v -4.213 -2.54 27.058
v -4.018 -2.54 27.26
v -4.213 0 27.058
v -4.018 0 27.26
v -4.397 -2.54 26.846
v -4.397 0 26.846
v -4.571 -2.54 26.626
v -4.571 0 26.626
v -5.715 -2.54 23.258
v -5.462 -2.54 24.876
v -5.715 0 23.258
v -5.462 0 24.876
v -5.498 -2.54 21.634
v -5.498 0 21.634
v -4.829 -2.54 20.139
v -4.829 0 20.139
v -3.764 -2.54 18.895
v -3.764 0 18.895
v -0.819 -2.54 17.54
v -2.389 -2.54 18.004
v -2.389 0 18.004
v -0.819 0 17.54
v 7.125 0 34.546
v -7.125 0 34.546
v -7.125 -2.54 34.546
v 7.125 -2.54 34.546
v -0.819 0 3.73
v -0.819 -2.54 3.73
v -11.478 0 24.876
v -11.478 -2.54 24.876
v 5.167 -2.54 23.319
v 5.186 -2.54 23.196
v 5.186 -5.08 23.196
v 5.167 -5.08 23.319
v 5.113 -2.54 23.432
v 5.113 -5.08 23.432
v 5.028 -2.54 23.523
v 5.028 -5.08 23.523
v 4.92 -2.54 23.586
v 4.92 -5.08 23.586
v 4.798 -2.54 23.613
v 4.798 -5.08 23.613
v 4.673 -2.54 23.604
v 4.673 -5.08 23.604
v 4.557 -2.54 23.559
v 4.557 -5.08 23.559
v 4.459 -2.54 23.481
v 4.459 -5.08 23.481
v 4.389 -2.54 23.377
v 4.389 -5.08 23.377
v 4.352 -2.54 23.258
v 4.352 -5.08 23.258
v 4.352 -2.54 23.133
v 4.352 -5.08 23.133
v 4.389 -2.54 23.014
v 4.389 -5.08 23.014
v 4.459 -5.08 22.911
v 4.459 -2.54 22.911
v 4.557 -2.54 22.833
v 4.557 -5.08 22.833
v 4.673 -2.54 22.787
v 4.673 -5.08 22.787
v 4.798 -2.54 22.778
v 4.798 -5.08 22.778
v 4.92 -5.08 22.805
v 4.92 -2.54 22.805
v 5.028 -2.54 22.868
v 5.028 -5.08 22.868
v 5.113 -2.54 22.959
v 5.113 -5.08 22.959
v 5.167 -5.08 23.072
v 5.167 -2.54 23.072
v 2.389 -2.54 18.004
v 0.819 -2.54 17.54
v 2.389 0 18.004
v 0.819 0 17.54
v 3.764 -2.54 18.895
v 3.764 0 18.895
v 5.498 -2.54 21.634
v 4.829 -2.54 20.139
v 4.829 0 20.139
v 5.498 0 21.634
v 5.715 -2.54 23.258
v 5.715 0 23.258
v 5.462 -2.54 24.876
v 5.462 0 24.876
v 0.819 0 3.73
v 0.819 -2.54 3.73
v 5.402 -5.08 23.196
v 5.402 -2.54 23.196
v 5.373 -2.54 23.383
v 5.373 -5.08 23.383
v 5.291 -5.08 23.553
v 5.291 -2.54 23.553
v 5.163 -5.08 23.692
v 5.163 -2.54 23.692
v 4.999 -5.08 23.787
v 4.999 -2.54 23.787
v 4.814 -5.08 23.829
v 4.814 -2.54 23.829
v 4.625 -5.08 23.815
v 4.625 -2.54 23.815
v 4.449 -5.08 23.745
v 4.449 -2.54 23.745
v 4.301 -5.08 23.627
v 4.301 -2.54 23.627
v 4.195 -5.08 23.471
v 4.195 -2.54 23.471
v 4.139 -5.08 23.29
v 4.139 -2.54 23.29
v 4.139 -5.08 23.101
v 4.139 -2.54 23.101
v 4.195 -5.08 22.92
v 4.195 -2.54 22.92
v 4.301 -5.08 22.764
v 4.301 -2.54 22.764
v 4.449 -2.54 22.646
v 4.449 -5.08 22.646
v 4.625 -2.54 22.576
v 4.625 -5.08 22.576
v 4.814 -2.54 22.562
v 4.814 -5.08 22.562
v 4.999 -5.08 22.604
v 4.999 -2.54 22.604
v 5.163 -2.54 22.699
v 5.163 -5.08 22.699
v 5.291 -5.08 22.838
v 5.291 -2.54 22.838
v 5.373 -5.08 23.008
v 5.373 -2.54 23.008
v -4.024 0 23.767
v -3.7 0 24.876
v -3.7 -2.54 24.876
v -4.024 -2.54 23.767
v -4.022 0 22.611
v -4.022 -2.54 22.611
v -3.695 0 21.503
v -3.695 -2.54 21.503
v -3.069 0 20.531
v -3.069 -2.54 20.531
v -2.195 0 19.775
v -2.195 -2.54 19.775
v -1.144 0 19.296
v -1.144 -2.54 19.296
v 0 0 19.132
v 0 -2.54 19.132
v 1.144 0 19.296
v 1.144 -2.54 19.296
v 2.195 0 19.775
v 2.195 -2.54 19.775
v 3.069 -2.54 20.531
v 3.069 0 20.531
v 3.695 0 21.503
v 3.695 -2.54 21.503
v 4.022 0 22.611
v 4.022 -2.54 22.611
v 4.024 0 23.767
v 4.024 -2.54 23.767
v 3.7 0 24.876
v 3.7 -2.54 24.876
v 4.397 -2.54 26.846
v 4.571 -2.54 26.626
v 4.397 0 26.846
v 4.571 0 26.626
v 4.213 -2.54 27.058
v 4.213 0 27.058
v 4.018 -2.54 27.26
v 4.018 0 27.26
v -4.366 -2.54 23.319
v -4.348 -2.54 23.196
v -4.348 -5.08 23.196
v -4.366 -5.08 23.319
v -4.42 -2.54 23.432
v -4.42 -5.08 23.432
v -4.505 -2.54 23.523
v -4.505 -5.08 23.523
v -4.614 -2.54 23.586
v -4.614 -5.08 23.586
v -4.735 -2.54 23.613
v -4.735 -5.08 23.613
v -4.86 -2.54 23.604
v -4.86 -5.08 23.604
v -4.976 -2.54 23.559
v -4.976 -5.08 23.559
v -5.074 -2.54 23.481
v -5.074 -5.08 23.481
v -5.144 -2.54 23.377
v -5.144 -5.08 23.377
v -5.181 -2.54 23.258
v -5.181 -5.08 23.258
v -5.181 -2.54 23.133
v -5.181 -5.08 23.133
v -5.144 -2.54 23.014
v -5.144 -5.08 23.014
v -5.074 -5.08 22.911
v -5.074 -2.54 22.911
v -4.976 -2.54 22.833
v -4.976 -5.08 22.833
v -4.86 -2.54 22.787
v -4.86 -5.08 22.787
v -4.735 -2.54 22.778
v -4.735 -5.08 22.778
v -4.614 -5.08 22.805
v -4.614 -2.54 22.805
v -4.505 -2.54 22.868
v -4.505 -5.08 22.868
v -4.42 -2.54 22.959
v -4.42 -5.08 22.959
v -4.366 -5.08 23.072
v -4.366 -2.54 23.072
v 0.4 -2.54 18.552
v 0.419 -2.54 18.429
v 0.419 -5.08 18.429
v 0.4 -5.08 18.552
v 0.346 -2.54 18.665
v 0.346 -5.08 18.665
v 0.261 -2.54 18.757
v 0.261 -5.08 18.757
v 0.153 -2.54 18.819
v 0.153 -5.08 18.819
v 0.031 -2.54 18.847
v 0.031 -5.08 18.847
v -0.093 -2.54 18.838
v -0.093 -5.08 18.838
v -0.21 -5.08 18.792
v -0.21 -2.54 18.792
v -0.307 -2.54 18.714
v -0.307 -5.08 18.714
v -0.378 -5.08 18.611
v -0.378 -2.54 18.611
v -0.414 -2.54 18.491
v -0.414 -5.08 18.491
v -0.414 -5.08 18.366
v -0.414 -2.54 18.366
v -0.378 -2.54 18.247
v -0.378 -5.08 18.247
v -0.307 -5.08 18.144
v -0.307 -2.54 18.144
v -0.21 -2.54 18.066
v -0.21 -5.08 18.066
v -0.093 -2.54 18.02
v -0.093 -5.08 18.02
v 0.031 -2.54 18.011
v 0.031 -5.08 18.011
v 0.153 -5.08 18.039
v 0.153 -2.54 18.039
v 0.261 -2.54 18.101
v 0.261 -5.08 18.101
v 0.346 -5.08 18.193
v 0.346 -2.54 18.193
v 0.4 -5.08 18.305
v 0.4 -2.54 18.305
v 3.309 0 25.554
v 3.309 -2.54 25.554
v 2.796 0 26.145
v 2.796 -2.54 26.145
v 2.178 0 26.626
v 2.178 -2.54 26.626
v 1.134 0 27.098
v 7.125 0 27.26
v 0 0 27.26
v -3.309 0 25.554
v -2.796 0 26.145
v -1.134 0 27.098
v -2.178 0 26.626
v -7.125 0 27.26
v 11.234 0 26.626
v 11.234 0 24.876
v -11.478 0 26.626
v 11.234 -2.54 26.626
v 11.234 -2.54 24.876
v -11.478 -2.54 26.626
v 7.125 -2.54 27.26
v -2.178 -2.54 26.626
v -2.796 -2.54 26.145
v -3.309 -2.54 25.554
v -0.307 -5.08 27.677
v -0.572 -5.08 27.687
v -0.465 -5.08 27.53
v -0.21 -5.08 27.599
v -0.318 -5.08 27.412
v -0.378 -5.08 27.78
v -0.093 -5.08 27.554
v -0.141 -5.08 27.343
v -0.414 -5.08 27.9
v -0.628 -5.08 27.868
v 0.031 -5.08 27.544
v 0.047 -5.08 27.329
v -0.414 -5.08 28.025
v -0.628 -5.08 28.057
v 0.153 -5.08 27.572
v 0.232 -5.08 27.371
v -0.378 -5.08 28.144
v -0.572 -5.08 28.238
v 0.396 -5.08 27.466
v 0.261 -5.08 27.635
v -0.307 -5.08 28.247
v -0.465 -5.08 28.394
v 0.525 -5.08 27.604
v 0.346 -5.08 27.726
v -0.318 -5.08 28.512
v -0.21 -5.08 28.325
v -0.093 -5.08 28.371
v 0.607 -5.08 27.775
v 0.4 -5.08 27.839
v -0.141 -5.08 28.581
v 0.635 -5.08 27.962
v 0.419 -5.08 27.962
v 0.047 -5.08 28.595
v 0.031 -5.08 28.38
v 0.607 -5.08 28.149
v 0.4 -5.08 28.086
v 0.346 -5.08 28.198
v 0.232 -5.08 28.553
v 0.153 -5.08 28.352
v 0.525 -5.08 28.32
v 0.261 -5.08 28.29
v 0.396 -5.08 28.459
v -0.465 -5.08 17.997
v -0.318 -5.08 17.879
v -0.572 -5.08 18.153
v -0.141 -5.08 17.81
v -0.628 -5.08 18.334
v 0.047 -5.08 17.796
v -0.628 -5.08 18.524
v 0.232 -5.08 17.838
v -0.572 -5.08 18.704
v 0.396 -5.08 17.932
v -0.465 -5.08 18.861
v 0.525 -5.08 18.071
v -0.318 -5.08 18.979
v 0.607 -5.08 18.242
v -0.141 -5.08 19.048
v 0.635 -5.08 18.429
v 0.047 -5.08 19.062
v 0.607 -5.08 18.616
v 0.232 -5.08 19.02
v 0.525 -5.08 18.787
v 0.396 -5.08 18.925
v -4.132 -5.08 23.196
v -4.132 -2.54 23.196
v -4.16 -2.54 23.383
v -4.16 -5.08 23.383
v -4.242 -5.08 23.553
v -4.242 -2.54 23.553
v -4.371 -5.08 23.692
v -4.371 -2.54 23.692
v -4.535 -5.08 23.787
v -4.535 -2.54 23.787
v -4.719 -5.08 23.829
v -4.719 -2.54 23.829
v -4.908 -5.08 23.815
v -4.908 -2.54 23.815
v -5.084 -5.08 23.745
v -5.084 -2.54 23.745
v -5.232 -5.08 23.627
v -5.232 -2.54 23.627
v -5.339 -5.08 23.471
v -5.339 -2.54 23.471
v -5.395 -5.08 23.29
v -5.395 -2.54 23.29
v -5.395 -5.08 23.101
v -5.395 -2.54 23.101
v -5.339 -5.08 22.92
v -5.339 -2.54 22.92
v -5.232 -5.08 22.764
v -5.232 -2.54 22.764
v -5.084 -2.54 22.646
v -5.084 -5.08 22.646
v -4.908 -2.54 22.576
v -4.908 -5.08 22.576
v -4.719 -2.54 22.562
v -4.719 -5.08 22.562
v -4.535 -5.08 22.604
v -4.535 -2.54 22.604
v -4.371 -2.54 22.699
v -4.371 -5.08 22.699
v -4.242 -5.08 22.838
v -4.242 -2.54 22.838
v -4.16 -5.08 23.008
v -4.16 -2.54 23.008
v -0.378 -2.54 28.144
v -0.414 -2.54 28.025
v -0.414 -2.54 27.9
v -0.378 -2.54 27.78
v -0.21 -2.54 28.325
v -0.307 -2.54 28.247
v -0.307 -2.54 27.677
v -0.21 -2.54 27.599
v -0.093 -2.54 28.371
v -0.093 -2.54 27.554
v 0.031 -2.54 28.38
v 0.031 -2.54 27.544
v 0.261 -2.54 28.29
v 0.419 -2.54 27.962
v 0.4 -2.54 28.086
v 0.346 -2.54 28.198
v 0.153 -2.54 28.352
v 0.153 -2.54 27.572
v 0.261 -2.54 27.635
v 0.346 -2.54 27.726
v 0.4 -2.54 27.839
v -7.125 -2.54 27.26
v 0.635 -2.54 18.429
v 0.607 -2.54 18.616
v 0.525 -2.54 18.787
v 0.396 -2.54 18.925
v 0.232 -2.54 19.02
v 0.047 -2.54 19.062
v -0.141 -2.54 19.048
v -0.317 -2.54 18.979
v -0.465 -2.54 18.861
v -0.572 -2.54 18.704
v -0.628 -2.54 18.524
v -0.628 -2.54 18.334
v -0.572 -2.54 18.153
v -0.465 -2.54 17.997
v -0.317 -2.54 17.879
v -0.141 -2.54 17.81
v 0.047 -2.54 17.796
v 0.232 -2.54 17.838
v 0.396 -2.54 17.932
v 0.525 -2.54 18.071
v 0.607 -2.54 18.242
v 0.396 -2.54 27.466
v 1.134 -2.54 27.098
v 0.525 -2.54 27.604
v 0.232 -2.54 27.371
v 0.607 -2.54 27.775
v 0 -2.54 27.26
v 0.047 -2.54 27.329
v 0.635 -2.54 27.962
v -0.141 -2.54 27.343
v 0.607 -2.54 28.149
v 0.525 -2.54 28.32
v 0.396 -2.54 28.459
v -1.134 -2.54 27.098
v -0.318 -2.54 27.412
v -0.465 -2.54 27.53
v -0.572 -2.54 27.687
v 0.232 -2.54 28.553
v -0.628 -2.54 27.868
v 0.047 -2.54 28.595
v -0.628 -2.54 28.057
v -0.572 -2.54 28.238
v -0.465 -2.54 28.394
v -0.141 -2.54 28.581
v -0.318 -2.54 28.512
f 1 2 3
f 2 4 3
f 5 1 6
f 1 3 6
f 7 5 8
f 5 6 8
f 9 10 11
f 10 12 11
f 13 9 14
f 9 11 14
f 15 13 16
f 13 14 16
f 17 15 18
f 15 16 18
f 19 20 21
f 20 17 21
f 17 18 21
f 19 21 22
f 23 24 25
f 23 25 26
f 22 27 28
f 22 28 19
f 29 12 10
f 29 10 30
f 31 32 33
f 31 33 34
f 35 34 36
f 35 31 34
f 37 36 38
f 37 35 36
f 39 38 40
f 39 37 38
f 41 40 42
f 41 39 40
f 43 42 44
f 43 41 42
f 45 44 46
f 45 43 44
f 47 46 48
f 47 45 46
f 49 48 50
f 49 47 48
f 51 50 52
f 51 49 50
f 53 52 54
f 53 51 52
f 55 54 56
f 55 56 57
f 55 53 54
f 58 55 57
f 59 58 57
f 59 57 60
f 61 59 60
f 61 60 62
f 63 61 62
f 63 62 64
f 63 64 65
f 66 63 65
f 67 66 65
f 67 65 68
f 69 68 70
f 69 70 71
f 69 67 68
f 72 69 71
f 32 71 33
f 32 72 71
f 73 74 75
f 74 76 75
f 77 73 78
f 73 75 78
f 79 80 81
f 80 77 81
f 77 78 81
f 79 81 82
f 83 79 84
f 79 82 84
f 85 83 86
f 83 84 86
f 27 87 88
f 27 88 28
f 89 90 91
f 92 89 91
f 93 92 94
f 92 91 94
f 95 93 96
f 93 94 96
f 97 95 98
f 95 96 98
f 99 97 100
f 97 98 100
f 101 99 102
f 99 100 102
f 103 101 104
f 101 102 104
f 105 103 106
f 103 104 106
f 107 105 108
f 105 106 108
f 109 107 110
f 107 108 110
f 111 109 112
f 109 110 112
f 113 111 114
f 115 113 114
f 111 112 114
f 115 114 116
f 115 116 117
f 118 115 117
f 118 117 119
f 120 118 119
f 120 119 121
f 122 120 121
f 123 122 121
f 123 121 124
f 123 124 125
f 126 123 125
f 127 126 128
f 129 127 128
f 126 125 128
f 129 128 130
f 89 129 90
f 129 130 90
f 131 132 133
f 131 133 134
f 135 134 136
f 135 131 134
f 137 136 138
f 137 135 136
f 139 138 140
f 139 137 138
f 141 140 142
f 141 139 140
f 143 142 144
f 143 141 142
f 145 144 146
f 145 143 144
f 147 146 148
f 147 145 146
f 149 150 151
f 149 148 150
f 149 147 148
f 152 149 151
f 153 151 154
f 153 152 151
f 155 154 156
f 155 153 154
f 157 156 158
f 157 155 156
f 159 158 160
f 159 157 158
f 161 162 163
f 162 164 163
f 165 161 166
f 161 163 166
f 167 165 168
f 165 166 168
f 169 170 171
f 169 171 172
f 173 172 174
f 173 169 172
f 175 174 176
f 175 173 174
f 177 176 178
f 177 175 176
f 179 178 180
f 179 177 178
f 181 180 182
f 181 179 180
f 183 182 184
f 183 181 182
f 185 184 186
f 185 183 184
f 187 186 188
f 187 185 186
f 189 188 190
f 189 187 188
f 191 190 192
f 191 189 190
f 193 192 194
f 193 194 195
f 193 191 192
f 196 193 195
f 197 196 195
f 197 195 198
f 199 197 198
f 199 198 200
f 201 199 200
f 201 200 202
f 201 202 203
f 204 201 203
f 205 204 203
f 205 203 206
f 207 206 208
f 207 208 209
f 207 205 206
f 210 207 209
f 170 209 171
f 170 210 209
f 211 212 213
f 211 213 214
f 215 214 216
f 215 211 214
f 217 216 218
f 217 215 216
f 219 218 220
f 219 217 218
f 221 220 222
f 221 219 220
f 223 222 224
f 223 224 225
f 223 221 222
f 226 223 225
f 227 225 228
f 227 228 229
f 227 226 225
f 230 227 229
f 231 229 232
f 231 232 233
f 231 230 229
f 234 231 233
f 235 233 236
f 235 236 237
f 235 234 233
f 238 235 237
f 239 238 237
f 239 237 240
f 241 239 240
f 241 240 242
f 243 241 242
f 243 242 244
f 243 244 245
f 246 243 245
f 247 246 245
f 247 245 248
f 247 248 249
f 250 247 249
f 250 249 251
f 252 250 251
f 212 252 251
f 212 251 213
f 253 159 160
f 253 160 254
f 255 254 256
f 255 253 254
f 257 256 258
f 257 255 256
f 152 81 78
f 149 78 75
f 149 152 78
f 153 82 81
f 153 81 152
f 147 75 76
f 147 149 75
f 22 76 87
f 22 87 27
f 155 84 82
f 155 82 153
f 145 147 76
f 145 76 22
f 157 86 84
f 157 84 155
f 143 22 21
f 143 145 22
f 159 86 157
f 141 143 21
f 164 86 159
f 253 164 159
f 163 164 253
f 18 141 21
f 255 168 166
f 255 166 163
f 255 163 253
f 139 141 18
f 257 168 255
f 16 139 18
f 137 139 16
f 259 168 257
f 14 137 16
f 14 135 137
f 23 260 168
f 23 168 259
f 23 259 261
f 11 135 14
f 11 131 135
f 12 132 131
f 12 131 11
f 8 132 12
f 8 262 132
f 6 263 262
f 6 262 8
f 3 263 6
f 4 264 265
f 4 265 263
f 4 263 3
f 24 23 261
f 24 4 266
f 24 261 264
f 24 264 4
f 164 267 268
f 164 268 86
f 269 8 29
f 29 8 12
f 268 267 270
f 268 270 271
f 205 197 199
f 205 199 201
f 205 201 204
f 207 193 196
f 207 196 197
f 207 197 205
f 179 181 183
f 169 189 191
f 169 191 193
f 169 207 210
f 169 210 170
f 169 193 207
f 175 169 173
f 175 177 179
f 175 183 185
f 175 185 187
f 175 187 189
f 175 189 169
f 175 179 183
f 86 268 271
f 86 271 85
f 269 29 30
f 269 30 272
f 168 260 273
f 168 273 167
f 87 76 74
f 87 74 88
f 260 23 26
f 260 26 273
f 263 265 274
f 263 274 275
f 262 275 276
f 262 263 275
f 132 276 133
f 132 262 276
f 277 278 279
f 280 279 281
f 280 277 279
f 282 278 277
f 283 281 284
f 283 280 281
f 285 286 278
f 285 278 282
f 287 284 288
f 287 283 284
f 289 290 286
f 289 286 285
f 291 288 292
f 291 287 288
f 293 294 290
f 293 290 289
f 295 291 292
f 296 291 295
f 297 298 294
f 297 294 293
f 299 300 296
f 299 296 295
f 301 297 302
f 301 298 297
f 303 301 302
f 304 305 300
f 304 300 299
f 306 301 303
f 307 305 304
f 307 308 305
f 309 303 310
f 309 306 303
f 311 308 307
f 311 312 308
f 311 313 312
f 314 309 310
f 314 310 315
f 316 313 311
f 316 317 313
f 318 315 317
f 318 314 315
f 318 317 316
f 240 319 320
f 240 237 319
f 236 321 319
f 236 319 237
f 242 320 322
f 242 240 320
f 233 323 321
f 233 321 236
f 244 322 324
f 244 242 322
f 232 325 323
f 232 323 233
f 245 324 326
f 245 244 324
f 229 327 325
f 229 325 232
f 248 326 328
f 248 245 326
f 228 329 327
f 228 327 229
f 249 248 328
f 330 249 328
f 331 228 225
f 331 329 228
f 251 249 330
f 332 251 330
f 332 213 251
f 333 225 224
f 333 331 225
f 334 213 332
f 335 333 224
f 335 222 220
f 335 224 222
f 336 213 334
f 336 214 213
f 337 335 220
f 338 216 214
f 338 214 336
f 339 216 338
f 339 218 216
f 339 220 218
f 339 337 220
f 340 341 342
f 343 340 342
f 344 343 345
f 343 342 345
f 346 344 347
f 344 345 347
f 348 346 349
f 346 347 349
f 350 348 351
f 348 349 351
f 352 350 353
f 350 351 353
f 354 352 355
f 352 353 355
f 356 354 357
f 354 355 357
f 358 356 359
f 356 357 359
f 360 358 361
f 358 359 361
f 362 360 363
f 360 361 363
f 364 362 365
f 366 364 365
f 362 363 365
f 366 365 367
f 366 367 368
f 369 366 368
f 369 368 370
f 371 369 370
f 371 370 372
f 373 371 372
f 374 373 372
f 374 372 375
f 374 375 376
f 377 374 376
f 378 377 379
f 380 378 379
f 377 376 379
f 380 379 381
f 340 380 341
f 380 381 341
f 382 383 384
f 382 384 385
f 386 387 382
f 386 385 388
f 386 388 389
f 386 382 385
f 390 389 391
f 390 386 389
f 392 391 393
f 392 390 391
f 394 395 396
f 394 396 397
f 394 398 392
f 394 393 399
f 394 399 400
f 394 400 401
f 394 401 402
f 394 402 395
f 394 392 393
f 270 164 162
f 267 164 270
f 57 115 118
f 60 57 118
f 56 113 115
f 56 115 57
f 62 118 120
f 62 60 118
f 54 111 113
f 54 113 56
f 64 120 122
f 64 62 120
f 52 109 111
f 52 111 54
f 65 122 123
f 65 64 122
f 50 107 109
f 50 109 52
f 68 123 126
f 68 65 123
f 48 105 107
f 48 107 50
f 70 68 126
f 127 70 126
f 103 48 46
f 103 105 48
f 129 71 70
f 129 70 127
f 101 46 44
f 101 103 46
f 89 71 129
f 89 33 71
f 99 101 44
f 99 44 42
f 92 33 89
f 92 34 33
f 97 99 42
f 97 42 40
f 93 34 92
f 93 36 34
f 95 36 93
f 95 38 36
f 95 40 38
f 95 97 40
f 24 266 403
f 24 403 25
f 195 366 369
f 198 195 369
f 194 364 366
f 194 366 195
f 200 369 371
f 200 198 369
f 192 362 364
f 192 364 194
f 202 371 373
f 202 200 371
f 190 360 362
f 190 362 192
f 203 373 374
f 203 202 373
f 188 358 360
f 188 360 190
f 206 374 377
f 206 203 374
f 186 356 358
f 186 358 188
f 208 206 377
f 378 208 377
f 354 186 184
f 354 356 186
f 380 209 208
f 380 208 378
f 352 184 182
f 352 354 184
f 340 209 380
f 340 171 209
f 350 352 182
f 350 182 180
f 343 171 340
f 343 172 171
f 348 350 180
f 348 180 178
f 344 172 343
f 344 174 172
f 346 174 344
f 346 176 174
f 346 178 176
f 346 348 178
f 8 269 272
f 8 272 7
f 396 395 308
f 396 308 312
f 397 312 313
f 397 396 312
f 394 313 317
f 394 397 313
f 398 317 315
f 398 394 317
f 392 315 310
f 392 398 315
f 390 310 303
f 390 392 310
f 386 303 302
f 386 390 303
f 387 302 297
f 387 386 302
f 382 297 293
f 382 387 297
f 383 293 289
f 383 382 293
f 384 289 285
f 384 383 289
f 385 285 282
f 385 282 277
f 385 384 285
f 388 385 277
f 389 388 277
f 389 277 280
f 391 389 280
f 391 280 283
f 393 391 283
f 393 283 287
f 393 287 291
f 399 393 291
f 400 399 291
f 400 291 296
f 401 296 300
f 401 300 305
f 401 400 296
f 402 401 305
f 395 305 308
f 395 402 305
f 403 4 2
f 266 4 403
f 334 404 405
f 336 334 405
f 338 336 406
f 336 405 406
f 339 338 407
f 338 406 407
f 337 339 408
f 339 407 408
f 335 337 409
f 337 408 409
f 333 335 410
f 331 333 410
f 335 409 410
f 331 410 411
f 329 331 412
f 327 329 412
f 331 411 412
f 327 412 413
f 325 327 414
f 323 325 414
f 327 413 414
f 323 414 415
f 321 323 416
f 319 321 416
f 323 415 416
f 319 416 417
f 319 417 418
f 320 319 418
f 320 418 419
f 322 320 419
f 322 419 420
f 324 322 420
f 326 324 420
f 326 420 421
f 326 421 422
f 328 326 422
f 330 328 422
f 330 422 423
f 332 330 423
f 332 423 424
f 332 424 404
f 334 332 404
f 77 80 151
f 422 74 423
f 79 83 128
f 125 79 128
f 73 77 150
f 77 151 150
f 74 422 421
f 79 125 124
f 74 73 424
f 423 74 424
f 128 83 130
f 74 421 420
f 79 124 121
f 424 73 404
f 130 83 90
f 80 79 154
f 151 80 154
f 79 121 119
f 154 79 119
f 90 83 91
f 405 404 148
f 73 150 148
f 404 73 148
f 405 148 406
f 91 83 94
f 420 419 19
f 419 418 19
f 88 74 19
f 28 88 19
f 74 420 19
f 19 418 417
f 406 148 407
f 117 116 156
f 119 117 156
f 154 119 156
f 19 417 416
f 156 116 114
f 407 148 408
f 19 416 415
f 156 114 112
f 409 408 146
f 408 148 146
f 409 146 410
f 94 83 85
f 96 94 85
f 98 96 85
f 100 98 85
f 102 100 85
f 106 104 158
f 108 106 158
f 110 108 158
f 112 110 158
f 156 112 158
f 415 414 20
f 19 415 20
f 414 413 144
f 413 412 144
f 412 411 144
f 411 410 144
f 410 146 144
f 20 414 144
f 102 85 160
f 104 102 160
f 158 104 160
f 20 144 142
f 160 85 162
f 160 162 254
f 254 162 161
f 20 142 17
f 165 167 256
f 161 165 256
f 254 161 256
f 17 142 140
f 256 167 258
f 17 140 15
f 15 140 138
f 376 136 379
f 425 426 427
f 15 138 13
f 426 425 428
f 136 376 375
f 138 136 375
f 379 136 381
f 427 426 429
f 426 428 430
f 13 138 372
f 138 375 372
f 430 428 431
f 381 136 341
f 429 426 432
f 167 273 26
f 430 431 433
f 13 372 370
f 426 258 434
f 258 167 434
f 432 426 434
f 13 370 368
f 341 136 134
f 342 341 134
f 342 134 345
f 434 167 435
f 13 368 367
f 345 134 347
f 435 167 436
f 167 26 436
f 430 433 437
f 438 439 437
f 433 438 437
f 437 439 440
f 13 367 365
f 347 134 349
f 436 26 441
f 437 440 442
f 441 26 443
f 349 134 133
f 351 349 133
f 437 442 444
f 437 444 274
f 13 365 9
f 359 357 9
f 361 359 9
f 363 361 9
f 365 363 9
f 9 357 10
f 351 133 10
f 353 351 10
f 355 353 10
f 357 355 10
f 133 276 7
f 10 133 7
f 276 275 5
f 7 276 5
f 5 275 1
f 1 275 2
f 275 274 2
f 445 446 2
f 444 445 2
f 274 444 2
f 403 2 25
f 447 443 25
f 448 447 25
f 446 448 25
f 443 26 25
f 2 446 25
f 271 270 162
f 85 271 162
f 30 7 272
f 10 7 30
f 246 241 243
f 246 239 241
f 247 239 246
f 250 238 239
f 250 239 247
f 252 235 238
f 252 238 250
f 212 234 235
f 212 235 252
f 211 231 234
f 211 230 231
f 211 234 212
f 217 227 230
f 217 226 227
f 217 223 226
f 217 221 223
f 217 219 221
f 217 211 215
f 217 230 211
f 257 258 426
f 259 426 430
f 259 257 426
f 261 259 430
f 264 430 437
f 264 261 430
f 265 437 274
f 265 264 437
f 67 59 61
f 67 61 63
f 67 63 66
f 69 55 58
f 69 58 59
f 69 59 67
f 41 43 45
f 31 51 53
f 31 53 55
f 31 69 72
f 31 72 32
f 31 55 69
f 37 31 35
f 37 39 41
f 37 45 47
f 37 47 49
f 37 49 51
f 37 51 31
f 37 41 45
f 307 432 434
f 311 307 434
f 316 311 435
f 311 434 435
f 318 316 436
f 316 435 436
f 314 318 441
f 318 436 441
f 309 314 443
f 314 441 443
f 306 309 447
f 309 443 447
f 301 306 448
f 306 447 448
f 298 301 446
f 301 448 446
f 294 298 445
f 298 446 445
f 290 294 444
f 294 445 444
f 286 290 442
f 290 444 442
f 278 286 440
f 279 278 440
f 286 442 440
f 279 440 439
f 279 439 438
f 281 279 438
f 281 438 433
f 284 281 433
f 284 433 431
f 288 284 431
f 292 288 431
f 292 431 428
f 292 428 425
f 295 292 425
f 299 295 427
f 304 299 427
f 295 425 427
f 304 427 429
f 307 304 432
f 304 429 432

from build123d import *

# Parameters (mm, degrees)
F0_R     = 5.715
F0_R_2   = 4.064
F1_DEPTH = 2.54
F2_R     = 0.635
F2_R_2   = 0.4191
F3_DEPTH = 2.54
F5_DEPTH = 2.54
F7_DEPTH = 2.54
F9_DEPTH = 2.54


with BuildPart() as f1:
    # F0 (on Front) → F1 (new body)
    with BuildSketch(Plane.XZ):
        with Locations((0, 23.195567)):
            Circle(F0_R)
        with Locations((0, 23.195567)):
            Circle(F0_R_2, mode=Mode.SUBTRACT)
    extrude(amount=F1_DEPTH)

    # F2 (on face) → F3 (join)
    with BuildSketch(Plane.XZ.offset(2.54)):
        with Locations((0, 27.962195)):
            Circle(F2_R)
        with Locations((0, 27.962195)):
            Circle(F2_R_2, mode=Mode.SUBTRACT)
        with Locations((-4.766628, 23.195567)):
            Circle(F2_R)
        with Locations((-4.766628, 23.195567)):
            Circle(F2_R_2, mode=Mode.SUBTRACT)
        with Locations((0, 18.428938)):
            Circle(F2_R)
        with Locations((0, 18.428938)):
            Circle(F2_R_2, mode=Mode.SUBTRACT)
        with Locations((4.766628, 23.195567)):
            Circle(F2_R)
        with Locations((4.766628, 23.195567)):
            Circle(F2_R_2, mode=Mode.SUBTRACT)
    extrude(amount=F3_DEPTH)

    # F4 (on face) → F5 (join)
    with BuildSketch(Plane(origin=(0, 0, 0), x_dir=(-1, 0, 0), z_dir=(0, 1, 0))):
        Polygon((-7.125023, 27.259567), (0, 27.259567), (7.12503, 27.259567), (7.12503, 34.545776), (-7.125023, 34.545776), align=None)
    extrude(amount=-F5_DEPTH)

    # F6 (on face) → F7 (join)
    with BuildSketch(Plane(origin=(0, 0, 0), x_dir=(-1, 0, 0), z_dir=(0, 1, 0))):
        Polygon((0.818666, 18.264024), (0, 18.264024), (-0.818667, 18.264024), (-0.818667, 3.730329), (0.818666, 3.730329), align=None)
    extrude(amount=-F7_DEPTH)

    # F8 (on face) → F9 (join)
    with BuildSketch(Plane(origin=(0, 0, 0), x_dir=(-1, 0, 0), z_dir=(0, 1, 0))):
        with BuildLine():
            Line((-2.178273, 26.626488), (-11.233678, 26.626488))
            Line((-11.233678, 26.626488), (-11.233678, 24.87598))
            Line((-11.233678, 24.87598), (-3.700312, 24.87598))
            ThreePointArc((-3.700312, 24.87598), (-3.06684, 25.862135), (-2.178273, 26.626488))
        make_face()
        with BuildLine():
            Line((11.478047, 24.87598), (11.478047, 26.626488))
            Line((11.478047, 26.626488), (2.178273, 26.626488))
            ThreePointArc((2.178273, 26.626488), (3.06684, 25.862135), (3.700312, 24.87598))
            Line((3.700312, 24.87598), (11.478047, 24.87598))
        make_face()
    extrude(amount=-F9_DEPTH)


solid = f1.part
